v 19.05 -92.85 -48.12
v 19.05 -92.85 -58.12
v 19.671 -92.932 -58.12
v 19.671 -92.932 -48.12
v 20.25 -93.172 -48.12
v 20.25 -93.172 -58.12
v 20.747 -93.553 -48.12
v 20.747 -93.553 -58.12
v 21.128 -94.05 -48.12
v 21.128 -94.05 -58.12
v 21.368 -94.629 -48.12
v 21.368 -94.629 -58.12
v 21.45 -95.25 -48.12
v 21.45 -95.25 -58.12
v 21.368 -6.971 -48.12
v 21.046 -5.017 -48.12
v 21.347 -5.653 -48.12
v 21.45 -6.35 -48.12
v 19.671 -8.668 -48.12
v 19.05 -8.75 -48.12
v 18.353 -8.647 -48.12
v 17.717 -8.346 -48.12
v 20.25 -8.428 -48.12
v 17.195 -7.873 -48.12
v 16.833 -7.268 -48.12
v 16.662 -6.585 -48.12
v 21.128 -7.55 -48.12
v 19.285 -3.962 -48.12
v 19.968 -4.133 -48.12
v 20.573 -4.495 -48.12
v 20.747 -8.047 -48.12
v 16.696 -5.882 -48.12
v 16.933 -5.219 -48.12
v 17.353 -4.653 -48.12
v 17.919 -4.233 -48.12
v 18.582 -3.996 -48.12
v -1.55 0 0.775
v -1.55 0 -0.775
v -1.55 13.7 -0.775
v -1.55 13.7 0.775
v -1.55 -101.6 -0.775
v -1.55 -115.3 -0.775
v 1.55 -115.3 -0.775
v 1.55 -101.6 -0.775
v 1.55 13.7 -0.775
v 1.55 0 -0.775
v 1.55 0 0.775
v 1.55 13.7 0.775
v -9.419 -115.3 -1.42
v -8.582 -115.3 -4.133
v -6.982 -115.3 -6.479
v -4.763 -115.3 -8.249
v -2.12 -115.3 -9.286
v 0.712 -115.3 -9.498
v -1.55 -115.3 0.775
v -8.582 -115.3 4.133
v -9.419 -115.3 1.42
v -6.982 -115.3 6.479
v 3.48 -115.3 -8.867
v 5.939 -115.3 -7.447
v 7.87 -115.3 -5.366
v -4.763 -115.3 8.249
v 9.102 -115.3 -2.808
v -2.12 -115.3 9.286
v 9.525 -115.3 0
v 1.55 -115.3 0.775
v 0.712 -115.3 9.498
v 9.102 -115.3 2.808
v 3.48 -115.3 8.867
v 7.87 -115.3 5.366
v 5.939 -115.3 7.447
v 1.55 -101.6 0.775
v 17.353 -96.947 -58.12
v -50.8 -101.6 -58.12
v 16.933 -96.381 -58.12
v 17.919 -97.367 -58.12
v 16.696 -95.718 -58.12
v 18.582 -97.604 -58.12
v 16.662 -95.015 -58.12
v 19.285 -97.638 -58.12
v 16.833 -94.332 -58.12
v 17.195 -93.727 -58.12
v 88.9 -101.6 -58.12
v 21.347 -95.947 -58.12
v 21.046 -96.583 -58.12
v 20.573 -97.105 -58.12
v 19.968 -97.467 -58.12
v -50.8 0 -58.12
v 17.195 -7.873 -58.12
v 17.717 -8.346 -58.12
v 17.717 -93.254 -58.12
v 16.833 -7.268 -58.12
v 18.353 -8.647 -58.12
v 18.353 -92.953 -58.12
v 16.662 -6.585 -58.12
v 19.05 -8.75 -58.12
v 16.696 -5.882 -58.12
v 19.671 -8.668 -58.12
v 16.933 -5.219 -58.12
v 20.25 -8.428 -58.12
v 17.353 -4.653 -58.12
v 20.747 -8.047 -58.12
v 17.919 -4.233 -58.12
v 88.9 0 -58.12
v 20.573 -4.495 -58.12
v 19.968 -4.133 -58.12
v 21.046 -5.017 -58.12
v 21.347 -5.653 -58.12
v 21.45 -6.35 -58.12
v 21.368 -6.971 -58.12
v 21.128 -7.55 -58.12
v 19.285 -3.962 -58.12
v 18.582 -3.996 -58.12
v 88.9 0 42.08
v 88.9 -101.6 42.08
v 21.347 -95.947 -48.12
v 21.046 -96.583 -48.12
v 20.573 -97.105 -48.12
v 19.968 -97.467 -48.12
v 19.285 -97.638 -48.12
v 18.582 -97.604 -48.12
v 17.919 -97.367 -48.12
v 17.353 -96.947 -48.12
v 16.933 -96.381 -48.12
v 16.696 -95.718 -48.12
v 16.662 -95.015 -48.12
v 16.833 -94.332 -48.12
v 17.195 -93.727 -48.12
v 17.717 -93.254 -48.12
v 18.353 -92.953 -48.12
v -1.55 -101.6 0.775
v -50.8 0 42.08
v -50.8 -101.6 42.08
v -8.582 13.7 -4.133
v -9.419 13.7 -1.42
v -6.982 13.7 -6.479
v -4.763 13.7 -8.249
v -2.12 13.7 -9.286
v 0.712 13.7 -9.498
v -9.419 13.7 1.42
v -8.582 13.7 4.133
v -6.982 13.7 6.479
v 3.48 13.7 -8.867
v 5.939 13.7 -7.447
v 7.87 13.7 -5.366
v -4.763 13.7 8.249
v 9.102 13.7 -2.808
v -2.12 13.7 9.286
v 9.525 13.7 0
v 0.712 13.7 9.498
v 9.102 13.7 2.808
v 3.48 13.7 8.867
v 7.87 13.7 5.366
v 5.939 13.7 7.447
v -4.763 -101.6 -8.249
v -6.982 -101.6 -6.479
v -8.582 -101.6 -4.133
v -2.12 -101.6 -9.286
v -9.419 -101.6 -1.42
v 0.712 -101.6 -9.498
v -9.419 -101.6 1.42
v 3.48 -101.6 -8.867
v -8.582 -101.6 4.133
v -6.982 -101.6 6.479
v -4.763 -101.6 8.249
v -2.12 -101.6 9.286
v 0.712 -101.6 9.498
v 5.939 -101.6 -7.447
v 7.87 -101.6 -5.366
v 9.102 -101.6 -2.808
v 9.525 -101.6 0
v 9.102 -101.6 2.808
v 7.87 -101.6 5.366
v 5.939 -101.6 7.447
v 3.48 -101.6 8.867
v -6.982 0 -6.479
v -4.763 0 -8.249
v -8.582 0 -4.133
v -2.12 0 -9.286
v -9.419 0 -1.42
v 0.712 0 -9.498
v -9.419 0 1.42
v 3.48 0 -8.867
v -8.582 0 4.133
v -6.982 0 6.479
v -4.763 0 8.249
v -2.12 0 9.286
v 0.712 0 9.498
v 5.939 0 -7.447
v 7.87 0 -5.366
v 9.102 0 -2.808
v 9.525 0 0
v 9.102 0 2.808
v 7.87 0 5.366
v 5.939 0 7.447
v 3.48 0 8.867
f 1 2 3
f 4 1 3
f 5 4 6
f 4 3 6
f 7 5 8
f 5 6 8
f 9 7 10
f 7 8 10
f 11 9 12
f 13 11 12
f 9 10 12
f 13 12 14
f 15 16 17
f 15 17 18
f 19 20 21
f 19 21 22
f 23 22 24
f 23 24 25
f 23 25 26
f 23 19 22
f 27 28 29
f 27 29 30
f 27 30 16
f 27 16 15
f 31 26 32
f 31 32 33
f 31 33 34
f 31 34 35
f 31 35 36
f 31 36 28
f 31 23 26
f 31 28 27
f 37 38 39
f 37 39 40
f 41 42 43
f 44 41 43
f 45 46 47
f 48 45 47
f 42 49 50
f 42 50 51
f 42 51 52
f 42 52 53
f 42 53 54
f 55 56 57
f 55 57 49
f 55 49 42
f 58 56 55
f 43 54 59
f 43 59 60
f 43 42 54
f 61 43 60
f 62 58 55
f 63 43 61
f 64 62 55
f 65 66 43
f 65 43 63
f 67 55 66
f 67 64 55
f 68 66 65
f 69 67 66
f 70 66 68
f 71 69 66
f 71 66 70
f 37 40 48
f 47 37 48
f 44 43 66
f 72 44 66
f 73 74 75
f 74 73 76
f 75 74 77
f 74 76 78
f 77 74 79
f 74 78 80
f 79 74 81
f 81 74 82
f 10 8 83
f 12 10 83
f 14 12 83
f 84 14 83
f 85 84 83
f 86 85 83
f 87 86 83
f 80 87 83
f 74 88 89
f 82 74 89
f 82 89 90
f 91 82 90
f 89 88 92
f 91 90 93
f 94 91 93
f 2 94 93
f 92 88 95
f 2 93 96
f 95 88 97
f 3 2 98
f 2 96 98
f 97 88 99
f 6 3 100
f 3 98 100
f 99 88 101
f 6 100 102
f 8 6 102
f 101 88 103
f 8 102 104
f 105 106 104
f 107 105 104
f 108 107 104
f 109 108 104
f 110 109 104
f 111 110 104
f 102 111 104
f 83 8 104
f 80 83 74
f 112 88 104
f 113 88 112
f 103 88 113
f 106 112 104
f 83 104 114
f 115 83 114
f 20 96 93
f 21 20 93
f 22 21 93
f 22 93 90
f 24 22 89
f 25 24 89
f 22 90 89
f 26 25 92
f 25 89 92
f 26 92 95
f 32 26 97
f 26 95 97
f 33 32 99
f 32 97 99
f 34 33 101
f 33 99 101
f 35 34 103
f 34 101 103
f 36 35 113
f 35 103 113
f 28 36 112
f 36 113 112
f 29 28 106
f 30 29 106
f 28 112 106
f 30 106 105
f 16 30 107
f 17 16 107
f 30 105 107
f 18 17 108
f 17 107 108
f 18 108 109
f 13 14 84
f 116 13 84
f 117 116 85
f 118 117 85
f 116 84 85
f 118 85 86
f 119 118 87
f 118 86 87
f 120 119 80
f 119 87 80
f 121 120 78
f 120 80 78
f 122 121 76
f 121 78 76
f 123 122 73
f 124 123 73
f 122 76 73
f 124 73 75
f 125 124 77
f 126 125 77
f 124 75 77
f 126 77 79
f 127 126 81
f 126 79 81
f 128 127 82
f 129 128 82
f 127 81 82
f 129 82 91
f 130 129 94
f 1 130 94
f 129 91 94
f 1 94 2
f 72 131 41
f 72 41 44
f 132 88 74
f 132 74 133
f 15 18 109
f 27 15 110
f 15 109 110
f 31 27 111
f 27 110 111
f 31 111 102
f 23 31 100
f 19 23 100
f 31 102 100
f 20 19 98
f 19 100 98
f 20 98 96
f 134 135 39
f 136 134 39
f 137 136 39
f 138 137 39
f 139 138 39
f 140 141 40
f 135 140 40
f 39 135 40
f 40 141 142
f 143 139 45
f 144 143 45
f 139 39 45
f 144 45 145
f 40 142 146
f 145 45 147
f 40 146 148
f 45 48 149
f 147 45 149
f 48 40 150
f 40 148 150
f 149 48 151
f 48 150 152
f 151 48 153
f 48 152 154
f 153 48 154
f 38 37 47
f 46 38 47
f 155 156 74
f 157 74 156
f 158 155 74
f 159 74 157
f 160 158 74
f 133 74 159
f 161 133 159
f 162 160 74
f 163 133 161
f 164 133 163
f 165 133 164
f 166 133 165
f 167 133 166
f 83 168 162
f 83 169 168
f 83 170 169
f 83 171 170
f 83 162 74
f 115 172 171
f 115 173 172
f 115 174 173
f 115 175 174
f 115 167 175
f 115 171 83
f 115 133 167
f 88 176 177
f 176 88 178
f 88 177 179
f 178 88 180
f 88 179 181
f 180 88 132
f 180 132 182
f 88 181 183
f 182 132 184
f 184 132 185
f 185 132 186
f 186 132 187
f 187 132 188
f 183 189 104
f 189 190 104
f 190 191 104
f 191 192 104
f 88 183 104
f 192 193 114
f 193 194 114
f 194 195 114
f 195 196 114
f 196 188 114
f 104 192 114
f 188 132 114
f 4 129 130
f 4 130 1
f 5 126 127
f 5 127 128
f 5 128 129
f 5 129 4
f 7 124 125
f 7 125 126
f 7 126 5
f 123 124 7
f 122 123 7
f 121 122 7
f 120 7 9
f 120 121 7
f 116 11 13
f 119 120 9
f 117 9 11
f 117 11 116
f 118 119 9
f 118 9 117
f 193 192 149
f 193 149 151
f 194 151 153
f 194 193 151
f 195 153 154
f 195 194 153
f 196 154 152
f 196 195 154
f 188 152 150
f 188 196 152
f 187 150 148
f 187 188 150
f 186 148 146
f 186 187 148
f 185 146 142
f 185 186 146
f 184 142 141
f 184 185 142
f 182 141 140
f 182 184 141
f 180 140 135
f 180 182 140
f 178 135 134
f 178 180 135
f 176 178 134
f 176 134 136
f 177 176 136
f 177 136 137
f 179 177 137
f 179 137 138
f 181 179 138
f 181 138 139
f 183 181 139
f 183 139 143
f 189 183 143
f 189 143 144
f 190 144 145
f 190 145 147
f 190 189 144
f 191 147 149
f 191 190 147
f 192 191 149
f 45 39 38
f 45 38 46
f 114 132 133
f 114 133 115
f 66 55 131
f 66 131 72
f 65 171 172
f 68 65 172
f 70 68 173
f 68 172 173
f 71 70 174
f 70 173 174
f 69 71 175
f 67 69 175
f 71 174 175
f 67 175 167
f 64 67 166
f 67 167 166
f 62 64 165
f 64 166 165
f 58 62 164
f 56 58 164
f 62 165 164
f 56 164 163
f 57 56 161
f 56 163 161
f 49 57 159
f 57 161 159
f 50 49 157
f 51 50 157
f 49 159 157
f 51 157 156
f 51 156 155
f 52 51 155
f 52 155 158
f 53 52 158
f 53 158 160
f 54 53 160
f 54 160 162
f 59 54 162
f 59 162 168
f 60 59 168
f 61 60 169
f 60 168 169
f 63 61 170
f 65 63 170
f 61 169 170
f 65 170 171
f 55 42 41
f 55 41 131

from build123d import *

# Parameters (mm, degrees)
F0_W     = 139.7
F0_H     = 100.2
F0_R     = 9.525
F0_W_2   = 3.1
F0_H_2   = 1.55
F1_DEPTH = 101.6
F2_DEPTH = 13.7
F4_R     = 9.525
F4_W     = 3.1
F4_H     = 1.55
F5_DEPTH = 13.7
F7_DEPTH = 10


with BuildPart() as f1:
    # F0 (on Front) → F1 (new body)
    with BuildSketch(Plane.XZ):
        with Locations((19.05, -8.02)):
            Rectangle(F0_W, F0_H)
        Circle(F0_R, mode=Mode.SUBTRACT)
        Circle(F0_R)
        Rectangle(F0_W_2, F0_H_2, mode=Mode.SUBTRACT)
        Rectangle(F0_W_2, F0_H_2)
    extrude(amount=F1_DEPTH)

    # F0 (on Front) → F2 (join)
    with BuildSketch(Plane.XZ):
        Circle(F0_R)
        Rectangle(F0_W_2, F0_H_2, mode=Mode.SUBTRACT)
    extrude(amount=-F2_DEPTH)

    # F4 (on offset) → F5 (join)
    with BuildSketch(Plane.XZ.offset(101.6)):
        Circle(F4_R)
        Rectangle(F4_W, F4_H, mode=Mode.SUBTRACT)
    extrude(amount=F5_DEPTH)

    # F6 (on face) → F7 (cut)
    with BuildSketch(Plane(origin=(0, 0, -58.12), x_dir=(1, 0, 0), z_dir=(0, 0, -1))):
        with BuildLine():
            ThreePointArc((21.45, 95.25), (17.3529437252, 96.9470562748), (19.05, 92.85))
            ThreePointArc((19.05, 92.85), (20.7470562748, 93.5529437252), (21.45, 95.25))
        make_face()
        with BuildLine():
            ThreePointArc((21.45, 6.35), (20.7470562748, 8.0470562748), (19.05, 8.75))
            ThreePointArc((19.05, 8.75), (17.3529437252, 4.6529437252), (21.45, 6.35))
        make_face()
    extrude(amount=-F7_DEPTH, mode=Mode.SUBTRACT)


solid = f1.part
